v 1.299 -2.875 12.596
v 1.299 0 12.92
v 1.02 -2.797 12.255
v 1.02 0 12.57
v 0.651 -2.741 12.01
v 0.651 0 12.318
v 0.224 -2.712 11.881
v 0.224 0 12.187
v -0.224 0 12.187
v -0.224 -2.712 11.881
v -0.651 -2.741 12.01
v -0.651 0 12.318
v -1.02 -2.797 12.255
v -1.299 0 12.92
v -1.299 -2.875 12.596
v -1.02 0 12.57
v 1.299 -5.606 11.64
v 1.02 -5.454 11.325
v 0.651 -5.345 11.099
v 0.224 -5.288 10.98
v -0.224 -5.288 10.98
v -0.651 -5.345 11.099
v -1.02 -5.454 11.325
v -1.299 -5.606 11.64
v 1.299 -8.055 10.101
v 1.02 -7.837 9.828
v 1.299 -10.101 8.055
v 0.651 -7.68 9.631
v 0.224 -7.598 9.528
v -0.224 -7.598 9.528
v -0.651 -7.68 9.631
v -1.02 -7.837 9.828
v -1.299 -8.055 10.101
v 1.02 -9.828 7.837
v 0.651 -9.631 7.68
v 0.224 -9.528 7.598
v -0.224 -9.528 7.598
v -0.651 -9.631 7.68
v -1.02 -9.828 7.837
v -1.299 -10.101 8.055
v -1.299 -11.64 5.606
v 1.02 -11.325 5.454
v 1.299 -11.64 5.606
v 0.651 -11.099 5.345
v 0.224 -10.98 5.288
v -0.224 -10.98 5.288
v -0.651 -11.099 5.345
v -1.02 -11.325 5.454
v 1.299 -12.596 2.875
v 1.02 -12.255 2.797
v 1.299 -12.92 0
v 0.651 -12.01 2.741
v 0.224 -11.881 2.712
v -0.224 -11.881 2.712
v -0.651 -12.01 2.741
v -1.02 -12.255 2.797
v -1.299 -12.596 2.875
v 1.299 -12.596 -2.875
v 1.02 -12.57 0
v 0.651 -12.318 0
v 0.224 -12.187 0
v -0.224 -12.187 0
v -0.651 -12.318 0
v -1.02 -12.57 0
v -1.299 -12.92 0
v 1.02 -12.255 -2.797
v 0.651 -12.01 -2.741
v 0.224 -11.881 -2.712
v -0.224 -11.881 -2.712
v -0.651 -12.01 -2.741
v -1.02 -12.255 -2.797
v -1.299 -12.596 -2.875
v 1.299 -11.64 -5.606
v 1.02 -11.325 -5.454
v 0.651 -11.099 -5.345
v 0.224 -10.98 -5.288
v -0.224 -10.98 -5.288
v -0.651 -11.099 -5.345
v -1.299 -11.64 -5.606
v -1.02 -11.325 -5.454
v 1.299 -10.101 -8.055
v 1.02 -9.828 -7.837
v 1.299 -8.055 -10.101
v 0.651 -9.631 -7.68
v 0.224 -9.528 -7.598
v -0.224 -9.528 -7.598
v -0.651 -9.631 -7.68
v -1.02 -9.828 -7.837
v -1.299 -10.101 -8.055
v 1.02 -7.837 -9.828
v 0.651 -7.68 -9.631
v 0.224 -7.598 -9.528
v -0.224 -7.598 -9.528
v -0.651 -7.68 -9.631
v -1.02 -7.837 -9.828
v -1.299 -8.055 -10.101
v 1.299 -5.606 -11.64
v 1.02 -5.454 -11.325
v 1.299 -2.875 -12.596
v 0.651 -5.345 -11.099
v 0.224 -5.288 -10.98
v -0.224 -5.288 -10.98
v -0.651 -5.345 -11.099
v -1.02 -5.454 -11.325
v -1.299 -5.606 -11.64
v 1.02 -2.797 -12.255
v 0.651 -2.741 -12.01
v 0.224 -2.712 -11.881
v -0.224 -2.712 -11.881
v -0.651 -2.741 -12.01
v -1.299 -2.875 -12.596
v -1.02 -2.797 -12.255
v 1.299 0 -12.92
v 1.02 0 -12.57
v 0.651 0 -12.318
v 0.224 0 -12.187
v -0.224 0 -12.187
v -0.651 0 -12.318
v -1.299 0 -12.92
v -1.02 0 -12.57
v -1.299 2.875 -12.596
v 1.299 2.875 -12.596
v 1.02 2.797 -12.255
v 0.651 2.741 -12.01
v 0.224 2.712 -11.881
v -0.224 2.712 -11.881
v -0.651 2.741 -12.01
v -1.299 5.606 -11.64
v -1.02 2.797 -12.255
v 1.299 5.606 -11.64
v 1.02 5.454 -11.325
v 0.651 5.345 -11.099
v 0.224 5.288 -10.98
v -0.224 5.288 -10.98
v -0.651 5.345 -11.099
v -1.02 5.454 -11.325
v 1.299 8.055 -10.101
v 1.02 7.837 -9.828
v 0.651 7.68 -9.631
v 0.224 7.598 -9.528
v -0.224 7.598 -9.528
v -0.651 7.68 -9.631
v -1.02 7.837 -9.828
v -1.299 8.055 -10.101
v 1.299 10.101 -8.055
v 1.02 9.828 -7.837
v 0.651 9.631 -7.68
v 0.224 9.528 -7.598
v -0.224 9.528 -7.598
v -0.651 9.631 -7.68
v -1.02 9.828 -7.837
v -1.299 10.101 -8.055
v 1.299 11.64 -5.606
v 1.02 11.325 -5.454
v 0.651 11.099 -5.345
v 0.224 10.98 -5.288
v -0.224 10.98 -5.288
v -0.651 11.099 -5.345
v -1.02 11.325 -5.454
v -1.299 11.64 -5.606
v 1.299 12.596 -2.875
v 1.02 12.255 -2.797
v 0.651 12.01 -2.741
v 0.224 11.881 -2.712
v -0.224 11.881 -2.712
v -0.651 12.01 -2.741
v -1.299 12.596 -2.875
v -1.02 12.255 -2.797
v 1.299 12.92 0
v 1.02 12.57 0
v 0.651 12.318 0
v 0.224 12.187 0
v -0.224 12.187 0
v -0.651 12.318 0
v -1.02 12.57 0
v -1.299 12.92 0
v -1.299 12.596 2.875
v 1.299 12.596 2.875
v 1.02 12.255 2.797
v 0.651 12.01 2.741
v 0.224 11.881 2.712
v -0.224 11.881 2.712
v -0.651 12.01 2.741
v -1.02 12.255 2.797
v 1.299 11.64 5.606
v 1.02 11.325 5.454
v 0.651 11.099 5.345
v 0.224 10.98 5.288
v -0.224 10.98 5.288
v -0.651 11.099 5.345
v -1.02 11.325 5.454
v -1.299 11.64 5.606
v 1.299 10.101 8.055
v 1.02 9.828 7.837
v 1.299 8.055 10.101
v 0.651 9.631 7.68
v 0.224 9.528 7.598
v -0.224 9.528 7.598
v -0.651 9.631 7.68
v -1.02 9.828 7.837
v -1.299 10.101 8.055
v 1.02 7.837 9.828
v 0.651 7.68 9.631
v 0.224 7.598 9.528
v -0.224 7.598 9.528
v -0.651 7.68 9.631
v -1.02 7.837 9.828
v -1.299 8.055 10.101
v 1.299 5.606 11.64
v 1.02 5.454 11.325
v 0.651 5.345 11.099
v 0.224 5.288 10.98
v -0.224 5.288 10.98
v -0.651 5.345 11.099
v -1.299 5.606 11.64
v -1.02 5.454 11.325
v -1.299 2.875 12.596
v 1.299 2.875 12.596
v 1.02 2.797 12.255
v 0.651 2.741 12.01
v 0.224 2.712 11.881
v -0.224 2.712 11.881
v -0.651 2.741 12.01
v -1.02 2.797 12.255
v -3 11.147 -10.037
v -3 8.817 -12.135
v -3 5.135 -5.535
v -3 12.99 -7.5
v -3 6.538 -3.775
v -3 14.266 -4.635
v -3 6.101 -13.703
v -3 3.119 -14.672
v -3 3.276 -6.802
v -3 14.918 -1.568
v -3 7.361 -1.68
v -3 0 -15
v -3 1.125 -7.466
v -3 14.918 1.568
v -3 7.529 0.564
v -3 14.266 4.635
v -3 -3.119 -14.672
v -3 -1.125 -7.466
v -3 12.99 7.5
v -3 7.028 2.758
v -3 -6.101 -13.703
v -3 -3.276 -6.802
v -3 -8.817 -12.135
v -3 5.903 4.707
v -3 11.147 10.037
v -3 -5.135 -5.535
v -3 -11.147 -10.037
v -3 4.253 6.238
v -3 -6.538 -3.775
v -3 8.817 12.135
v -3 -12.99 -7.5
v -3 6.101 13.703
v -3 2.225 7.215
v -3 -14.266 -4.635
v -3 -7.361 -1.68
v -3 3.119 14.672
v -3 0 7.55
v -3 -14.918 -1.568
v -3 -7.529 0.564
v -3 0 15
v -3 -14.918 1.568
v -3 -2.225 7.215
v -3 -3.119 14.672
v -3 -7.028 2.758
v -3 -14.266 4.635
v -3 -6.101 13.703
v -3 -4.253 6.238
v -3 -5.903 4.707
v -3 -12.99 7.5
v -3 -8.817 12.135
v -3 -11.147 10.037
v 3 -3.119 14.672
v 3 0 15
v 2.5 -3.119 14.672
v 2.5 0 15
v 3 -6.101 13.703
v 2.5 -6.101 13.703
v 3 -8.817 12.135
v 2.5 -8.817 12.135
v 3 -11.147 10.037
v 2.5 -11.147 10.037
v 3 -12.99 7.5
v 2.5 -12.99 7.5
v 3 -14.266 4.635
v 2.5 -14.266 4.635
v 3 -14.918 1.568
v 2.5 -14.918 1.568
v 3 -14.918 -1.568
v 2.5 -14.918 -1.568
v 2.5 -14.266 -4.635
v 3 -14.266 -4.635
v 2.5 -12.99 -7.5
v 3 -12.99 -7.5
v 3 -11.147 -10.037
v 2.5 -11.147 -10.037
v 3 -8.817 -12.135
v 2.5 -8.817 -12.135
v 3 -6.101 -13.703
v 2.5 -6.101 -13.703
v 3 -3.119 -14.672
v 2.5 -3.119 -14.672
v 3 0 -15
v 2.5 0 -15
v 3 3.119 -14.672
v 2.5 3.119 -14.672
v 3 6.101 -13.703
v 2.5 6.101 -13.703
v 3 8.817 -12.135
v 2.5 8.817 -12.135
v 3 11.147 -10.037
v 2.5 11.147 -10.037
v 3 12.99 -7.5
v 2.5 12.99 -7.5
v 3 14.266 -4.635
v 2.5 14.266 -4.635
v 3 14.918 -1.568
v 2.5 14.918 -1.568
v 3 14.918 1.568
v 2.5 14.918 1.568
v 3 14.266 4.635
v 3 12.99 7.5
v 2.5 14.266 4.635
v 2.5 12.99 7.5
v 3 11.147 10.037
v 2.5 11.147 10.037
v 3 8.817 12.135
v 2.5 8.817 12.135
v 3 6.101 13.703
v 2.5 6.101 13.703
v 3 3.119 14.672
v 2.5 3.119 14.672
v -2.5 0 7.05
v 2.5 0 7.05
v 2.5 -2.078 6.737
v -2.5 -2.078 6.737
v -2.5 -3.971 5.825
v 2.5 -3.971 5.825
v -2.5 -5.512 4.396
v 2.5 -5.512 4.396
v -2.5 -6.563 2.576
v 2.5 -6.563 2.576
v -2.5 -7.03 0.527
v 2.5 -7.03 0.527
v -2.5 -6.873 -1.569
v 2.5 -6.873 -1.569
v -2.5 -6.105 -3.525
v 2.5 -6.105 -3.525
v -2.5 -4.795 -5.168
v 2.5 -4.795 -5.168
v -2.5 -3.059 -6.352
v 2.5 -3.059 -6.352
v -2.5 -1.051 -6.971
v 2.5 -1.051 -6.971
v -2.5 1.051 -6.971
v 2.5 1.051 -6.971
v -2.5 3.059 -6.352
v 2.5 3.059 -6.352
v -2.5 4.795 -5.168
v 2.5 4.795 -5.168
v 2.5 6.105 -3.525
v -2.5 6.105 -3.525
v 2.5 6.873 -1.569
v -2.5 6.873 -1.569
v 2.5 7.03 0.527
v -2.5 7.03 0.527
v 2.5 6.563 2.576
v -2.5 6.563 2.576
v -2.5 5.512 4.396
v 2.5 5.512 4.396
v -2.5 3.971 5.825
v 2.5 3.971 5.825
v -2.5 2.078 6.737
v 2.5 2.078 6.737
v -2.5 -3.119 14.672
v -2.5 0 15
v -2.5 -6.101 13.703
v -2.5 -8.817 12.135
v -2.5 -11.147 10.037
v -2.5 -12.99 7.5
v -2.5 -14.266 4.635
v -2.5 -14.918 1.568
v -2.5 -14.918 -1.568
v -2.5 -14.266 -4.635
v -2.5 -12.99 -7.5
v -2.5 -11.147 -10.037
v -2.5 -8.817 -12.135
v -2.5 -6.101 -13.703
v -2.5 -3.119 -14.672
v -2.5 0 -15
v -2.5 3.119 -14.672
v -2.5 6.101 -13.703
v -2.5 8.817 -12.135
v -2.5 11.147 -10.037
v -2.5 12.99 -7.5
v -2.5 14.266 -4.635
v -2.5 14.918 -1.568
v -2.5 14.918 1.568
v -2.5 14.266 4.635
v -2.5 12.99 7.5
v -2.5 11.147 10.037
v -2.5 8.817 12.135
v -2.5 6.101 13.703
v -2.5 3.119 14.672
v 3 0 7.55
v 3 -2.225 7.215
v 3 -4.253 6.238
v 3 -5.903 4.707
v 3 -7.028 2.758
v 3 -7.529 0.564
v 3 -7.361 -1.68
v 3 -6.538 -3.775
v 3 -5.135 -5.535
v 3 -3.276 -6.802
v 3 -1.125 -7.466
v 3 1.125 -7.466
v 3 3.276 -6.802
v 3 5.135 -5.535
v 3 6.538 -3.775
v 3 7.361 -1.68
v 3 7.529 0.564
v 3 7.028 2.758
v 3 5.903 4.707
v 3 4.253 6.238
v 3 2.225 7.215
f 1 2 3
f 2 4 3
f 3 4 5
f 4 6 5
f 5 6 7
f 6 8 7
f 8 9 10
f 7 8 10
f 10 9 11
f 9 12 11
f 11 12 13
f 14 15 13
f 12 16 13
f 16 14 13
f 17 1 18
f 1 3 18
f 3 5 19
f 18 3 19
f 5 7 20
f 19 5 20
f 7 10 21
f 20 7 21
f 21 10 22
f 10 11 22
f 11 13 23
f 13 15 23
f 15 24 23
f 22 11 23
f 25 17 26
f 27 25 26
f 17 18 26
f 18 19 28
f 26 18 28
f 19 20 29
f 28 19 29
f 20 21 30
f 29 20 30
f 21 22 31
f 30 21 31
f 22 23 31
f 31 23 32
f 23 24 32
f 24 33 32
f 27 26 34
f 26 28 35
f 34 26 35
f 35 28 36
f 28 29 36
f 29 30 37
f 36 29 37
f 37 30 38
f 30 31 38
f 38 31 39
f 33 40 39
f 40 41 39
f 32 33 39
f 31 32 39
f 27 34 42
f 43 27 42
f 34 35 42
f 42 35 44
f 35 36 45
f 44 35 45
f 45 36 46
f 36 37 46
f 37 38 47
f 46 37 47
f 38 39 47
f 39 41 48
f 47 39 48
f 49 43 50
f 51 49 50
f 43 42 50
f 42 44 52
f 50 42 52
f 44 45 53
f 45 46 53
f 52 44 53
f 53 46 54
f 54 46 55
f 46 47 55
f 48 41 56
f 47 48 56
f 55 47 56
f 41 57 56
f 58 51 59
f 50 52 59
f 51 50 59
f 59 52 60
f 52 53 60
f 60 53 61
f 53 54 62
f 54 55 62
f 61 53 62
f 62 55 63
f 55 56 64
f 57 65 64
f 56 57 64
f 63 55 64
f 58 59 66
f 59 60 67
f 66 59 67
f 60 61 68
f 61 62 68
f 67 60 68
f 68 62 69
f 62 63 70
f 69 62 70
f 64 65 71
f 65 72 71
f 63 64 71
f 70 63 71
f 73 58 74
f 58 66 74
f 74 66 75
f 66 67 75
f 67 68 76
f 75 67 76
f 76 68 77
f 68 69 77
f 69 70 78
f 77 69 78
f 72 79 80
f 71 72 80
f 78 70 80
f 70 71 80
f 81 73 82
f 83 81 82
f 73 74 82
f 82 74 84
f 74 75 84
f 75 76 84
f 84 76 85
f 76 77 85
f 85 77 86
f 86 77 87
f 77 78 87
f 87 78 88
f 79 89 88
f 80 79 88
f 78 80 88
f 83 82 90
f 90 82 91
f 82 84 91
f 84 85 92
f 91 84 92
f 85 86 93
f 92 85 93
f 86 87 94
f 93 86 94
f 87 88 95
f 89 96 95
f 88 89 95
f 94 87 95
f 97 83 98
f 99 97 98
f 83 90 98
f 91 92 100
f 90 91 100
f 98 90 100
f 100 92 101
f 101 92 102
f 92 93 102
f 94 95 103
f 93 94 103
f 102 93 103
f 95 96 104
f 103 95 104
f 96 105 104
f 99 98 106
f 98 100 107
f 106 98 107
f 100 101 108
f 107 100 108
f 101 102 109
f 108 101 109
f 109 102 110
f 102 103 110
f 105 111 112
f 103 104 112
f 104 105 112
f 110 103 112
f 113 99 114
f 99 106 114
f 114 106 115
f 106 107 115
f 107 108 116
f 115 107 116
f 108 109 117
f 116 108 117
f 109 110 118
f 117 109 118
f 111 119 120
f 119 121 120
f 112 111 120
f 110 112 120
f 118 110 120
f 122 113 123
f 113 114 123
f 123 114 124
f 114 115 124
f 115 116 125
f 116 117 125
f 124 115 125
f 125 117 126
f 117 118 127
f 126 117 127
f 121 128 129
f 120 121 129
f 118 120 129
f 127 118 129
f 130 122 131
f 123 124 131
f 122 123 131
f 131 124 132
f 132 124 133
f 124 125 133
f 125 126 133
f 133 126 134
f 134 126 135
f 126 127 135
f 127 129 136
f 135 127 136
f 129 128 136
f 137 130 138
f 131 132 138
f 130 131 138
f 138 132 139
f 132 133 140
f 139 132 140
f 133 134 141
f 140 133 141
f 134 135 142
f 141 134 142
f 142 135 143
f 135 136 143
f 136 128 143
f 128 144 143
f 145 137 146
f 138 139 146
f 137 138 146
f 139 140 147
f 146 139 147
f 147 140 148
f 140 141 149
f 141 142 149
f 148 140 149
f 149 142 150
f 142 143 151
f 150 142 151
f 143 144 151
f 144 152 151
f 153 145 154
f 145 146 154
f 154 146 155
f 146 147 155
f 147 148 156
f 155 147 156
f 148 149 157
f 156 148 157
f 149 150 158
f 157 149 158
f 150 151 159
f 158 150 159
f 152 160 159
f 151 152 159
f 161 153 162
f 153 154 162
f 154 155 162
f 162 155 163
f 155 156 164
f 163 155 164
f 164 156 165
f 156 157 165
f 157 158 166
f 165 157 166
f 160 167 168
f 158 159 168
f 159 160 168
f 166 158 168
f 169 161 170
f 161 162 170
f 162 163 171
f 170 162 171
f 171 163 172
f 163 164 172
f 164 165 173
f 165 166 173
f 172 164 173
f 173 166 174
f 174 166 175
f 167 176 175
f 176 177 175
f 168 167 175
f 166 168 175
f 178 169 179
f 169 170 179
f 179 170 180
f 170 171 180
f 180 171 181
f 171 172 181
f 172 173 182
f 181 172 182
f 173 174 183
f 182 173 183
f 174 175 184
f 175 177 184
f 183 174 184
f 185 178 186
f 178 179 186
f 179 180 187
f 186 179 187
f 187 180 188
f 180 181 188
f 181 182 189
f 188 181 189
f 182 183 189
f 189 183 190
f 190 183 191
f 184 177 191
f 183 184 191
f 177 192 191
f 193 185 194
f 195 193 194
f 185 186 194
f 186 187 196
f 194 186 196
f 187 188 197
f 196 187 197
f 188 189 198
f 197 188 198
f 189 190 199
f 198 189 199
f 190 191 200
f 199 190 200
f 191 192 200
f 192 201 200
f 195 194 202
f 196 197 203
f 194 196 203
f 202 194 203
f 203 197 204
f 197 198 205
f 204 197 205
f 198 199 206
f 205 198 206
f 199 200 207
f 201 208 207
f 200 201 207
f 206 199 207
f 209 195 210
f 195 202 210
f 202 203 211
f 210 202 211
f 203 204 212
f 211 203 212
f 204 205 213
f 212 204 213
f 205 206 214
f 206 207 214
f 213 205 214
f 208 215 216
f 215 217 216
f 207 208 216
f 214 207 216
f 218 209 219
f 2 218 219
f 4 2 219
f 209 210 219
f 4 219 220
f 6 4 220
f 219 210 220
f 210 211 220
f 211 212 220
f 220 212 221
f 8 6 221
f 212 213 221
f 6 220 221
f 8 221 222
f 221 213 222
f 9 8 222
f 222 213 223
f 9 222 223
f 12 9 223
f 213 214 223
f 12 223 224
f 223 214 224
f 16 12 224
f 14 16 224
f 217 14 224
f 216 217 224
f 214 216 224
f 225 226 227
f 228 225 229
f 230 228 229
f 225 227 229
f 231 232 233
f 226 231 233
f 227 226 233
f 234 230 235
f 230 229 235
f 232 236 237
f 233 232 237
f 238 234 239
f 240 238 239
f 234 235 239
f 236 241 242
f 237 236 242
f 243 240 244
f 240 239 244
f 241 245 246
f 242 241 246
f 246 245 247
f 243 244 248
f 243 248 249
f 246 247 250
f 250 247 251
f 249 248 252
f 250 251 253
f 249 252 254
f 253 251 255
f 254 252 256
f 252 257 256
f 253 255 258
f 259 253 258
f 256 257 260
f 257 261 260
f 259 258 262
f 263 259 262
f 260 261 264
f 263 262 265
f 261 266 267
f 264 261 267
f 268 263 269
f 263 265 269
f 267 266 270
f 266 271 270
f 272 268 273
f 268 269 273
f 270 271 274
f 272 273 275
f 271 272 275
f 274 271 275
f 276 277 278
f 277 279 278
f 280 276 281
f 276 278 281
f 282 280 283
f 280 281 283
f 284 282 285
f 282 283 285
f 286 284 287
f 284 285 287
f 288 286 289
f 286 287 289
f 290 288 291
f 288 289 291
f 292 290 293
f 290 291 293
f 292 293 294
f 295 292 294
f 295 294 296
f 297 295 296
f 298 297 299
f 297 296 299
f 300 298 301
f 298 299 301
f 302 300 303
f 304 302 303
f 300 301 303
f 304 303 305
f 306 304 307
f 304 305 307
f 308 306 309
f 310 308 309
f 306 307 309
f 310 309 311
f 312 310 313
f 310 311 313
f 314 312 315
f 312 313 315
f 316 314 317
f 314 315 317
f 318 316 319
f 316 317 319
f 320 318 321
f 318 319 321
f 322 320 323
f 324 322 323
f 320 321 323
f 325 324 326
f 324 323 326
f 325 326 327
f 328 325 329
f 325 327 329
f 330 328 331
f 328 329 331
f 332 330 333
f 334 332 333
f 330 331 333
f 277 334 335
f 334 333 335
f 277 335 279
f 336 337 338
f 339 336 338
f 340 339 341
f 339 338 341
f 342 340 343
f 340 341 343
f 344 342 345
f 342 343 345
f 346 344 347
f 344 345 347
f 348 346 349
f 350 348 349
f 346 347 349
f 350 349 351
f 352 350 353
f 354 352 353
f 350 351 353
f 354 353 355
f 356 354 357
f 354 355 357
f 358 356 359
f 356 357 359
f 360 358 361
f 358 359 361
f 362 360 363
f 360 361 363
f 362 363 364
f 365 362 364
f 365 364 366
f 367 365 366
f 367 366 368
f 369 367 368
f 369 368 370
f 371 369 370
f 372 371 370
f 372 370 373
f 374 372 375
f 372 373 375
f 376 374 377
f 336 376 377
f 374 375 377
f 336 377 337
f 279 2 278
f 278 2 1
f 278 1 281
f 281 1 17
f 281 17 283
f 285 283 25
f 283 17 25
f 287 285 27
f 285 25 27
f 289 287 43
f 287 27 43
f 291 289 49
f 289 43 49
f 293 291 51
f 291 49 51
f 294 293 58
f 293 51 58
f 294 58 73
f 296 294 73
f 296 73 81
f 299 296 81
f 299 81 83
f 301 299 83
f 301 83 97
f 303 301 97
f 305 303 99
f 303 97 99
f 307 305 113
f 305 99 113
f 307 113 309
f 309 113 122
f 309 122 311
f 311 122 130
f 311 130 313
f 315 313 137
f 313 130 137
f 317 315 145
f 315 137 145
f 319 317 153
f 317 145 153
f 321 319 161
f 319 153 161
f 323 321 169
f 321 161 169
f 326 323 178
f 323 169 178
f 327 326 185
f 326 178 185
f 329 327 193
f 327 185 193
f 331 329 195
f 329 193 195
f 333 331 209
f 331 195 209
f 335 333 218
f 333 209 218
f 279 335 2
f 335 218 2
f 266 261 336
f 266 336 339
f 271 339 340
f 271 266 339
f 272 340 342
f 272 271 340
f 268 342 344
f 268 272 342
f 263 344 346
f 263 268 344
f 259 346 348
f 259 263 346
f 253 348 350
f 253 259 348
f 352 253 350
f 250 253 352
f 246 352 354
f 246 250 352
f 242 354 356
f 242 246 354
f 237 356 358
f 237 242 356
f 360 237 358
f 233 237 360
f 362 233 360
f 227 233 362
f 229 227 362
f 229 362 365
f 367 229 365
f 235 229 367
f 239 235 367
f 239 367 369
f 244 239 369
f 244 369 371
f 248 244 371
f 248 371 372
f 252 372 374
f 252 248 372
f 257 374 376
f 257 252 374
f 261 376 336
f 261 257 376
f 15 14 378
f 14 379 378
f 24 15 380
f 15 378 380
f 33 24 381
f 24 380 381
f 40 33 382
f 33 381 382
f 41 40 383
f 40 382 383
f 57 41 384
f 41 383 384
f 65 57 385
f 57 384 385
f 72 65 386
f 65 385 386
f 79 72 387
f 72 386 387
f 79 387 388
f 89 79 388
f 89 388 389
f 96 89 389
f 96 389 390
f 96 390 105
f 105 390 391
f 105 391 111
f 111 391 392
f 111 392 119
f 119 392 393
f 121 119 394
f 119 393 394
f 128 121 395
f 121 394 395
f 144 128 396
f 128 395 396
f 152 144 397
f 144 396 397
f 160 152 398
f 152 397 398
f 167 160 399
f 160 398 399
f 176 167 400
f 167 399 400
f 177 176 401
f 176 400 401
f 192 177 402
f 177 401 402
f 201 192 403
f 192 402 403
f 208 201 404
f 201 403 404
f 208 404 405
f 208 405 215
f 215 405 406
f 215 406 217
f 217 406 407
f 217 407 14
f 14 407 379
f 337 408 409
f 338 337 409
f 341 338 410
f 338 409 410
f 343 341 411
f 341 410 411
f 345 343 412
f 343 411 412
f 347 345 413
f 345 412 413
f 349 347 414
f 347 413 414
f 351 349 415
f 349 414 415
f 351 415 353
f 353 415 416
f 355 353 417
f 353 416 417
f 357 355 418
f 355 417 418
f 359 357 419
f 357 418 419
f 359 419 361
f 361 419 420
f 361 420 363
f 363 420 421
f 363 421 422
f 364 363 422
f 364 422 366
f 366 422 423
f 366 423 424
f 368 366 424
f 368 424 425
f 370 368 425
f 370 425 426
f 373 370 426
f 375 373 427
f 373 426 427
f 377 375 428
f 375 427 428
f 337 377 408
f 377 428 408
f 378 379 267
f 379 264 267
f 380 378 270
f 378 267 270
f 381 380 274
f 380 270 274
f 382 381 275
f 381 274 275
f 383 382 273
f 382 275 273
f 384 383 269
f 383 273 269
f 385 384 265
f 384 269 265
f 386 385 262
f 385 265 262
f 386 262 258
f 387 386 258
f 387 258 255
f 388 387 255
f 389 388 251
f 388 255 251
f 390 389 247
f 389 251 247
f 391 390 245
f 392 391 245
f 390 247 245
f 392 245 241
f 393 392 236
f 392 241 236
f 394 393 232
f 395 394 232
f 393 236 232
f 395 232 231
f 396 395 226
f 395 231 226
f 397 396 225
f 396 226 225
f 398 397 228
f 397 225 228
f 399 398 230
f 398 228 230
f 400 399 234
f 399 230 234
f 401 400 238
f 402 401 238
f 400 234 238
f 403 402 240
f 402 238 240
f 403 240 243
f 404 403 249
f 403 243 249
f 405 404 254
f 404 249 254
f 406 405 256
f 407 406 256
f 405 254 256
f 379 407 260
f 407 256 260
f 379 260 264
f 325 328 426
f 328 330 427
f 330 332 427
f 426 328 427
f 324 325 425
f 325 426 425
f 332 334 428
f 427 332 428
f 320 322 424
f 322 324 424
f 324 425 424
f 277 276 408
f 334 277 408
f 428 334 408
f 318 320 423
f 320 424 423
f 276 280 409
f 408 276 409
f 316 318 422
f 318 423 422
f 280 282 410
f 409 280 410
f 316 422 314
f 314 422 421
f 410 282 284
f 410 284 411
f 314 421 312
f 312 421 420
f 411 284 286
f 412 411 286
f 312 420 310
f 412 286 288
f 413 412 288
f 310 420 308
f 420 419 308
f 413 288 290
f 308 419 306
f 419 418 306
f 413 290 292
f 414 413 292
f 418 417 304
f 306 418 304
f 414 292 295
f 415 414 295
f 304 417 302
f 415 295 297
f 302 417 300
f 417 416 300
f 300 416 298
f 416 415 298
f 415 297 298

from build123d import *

# Parameters (mm, degrees)
CHAMFER_1_SIZE = 0.5


with BuildPart() as part:
    # 草图1 → 旋转1 (revolve)
    with BuildSketch(Plane.XY, mode=Mode.PRIVATE) as revolve_1_sk:
        with BuildLine():
            Line((-3, 7.05), (3, 7.05))
            Line((3, 7.05), (3, 15))
            Line((3, 15), (2.5, 15))
            Line((2.5, 15), (1.299038106, 12.919872981))
            ThreePointArc((1.299038106, 12.919872981), (0, 12.169872981), (-1.299038106, 12.919872981))
            Line((-1.299038106, 12.919872981), (-2.5, 15))
            Line((-2.5, 15), (-3, 15))
            Line((-3, 15), (-3, 7.05))
        make_face()
    revolve(revolve_1_sk.sketch.rotate(Axis((-10.233108396, 0, 0), (1, 0, 0)), 90), axis=Axis((-10.233108396, 0, 0), (1, 0, 0)))

    # 倒角1
    chamfer_1_edges = [part.edges().sort_by_distance(p)[0] for p in [
        (3, 0, -7.05),
        (-3, 0, -7.05),
    ]]
    chamfer(chamfer_1_edges, length=CHAMFER_1_SIZE)


solid = part.part
